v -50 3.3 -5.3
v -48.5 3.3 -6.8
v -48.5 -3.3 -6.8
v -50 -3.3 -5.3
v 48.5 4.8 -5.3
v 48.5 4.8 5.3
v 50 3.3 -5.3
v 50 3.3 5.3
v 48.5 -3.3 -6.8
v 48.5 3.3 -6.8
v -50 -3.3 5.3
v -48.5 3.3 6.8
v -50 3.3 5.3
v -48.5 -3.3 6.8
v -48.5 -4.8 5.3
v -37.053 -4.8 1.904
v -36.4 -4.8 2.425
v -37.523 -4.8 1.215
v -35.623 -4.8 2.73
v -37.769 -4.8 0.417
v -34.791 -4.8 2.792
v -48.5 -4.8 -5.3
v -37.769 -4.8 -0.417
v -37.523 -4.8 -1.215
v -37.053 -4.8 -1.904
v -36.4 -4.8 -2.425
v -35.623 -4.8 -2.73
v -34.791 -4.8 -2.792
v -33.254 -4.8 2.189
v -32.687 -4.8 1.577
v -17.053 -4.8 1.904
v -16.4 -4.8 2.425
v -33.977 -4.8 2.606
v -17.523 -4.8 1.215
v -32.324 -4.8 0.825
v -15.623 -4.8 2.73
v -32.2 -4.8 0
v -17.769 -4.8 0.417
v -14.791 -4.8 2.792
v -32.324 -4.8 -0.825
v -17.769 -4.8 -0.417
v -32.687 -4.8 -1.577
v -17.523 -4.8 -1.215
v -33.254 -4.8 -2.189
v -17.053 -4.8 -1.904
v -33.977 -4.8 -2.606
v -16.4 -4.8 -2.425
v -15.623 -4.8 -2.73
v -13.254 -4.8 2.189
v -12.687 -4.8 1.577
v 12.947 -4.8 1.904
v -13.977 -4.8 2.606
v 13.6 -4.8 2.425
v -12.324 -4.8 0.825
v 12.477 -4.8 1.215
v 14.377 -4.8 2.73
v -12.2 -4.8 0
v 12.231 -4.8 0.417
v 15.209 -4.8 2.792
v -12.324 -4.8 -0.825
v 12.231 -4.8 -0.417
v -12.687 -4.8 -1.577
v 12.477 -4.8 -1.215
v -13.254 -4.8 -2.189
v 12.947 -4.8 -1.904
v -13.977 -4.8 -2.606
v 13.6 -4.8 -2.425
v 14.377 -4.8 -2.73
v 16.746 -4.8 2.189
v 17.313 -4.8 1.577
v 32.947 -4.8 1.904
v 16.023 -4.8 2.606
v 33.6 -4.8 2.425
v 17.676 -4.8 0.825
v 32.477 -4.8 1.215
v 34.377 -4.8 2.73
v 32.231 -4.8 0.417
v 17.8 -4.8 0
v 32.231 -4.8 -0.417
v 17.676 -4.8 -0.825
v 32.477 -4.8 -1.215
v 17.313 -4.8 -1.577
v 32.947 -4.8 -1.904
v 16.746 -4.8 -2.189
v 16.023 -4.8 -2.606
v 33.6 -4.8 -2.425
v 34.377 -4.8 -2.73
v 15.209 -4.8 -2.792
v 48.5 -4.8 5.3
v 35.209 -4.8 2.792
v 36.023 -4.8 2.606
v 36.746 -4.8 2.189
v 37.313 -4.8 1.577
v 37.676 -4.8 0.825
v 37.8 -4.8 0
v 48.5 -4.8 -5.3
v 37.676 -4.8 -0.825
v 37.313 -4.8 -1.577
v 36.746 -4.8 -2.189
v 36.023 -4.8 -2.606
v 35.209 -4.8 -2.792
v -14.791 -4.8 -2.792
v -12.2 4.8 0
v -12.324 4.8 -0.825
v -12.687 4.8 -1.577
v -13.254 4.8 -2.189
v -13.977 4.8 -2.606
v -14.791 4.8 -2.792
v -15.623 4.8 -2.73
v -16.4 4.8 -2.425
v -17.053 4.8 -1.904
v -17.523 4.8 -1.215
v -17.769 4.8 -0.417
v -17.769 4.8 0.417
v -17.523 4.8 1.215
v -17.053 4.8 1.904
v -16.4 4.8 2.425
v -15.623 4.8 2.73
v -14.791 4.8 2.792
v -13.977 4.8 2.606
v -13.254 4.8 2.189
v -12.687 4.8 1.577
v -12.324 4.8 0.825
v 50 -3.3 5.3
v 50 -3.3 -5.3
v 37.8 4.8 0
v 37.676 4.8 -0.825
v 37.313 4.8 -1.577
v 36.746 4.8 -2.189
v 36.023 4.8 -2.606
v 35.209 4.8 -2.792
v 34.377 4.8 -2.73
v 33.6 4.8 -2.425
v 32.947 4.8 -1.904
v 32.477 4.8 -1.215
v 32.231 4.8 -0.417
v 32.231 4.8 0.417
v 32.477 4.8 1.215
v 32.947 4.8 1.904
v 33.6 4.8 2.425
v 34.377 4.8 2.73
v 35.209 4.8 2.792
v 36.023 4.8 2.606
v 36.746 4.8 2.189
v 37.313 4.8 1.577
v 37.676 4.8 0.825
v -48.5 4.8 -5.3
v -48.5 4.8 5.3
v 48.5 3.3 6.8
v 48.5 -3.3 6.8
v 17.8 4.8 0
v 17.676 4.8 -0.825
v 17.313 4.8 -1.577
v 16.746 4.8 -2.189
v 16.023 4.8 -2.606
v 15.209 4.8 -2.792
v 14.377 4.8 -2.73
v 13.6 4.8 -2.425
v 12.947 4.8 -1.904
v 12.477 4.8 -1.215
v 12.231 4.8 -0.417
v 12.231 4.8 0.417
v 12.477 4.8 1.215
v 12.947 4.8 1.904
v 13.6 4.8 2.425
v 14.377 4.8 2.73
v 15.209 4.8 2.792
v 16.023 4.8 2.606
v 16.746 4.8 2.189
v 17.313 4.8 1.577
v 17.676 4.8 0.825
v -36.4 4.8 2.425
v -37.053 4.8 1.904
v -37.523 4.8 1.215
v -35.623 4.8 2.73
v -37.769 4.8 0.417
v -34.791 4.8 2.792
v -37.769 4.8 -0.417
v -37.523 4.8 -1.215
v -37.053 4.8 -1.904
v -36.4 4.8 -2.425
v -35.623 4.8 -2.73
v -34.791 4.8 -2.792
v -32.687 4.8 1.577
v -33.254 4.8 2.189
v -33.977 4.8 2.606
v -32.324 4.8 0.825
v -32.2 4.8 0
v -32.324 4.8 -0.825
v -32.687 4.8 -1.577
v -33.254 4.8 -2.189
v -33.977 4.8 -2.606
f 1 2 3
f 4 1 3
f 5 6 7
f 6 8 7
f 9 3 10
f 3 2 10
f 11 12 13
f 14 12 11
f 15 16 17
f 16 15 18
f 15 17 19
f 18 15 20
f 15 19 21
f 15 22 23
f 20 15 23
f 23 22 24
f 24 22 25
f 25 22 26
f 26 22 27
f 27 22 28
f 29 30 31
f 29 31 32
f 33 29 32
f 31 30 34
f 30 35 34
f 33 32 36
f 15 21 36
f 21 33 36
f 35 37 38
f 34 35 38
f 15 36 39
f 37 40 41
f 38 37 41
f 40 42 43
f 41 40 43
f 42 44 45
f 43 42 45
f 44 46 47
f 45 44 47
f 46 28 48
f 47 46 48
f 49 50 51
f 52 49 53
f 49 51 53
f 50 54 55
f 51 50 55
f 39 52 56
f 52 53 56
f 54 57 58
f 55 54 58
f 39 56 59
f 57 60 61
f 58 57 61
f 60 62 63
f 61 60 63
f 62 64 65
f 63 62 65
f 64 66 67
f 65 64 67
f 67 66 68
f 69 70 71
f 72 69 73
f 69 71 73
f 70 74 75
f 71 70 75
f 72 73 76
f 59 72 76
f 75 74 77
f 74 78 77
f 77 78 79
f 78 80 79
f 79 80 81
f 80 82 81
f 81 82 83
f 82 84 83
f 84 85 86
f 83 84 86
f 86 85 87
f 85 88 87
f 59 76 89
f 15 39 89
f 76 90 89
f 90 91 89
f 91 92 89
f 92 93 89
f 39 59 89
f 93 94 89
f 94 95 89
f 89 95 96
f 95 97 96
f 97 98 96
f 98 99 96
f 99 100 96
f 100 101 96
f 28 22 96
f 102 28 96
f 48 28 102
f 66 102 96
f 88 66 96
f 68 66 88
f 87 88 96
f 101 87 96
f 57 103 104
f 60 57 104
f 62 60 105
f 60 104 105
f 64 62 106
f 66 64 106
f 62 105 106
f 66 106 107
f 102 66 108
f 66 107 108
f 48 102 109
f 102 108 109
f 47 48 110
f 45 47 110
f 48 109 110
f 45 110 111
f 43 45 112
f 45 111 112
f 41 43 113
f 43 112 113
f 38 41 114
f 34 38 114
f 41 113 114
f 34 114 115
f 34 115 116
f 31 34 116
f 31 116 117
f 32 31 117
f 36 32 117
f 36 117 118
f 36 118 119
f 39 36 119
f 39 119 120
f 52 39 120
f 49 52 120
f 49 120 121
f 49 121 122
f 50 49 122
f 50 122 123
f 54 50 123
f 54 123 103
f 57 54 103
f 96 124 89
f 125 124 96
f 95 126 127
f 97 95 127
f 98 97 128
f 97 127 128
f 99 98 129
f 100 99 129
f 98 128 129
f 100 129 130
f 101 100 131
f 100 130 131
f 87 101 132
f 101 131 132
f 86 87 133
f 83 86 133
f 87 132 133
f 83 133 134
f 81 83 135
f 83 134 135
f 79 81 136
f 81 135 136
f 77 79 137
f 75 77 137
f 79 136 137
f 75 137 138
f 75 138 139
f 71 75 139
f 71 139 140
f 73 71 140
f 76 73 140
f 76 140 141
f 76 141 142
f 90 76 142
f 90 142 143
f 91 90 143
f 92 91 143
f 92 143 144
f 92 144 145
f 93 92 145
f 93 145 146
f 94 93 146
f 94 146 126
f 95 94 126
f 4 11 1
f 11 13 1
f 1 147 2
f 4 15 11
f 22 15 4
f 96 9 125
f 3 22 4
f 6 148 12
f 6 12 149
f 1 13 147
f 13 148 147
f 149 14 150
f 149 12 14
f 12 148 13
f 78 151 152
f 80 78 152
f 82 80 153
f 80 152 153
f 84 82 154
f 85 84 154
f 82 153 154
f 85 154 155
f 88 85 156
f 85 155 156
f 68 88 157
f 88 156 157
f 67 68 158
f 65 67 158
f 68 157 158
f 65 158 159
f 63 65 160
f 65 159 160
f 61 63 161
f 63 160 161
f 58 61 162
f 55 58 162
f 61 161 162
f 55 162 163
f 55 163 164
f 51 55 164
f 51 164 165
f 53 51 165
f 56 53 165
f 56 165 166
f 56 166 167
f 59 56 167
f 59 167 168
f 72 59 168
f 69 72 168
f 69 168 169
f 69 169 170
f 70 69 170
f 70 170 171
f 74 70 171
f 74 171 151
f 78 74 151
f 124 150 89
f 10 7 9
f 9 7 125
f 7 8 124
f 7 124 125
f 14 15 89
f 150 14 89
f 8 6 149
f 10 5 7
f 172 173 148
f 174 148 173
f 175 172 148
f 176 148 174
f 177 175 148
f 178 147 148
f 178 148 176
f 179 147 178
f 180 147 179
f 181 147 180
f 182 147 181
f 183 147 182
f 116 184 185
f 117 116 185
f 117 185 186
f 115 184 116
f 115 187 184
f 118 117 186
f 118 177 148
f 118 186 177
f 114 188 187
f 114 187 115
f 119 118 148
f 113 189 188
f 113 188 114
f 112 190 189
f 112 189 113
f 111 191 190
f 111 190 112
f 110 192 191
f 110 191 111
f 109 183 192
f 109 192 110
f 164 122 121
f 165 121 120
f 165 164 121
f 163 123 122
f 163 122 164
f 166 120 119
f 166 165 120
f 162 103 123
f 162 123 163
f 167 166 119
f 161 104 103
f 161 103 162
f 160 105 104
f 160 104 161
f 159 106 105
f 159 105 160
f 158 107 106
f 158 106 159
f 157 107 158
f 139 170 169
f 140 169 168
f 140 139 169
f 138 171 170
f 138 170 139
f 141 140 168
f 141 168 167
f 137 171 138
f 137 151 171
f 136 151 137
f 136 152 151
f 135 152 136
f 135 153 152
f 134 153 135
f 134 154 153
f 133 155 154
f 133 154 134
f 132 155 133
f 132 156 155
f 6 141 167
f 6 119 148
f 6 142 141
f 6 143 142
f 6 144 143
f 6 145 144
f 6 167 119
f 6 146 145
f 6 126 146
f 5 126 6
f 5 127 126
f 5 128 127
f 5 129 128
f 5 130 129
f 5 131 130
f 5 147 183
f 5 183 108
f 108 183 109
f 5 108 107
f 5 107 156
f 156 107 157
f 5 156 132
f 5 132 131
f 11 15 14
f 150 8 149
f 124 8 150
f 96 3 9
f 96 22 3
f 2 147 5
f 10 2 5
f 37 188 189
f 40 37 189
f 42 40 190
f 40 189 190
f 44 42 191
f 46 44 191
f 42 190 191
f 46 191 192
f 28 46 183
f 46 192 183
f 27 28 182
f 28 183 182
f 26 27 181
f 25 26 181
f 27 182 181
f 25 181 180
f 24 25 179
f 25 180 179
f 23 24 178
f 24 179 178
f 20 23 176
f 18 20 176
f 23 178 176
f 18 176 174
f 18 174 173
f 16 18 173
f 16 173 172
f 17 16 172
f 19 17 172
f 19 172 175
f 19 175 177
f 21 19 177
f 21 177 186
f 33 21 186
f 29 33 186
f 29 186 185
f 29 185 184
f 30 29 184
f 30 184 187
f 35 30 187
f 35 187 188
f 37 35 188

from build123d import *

# Parameters (mm, degrees)
SCHIZZO1_W                   = 100
SCHIZZO1_H                   = 13.6
ESTRUSIONE_ESTRUSIONE1_DEPTH = 9.6
FORO_5_6_5_6_1_D             = 5.6
SMUSSO1_SIZE                 = 1.5


with BuildPart() as part:
    # Schizzo1 → Estrusione-Estrusione1 (new body)
    with BuildSketch(Plane(origin=(0, 4.8, 0), x_dir=(1, 0, 0), z_dir=(0, 1, 0))):
        Rectangle(SCHIZZO1_W, SCHIZZO1_H)
    extrude(amount=-ESTRUSIONE_ESTRUSIONE1_DEPTH)

    # Foro Ø5.6 (5.6)-1 (through all)
    with Locations(Plane(origin=(0, -4.8, 0), x_dir=(-1, 0, 0), z_dir=(0, -1, 0))):
        with Locations((-35, 0), (35, 0), (-15, 0), (15, 0)):
            Hole(FORO_5_6_5_6_1_D / 2)

    # Smusso1
    smusso1_edges = [part.edges().sort_by_distance(p)[0] for p in [
        (0, -4.8, -6.8),
        (-50, -4.8, 0),
        (0, -4.8, 6.8),
        (-50, 4.8, 0),
        (0, 4.8, -6.8),
        (50, 4.8, 0),
        (0, 4.8, 6.8),
        (-50, 0, 6.8),
        (-50, 0, -6.8),
        (50, 0, -6.8),
        (50, 0, 6.8),
        (50, -4.8, 0),
    ]]
    chamfer(smusso1_edges, length=SMUSSO1_SIZE)


solid = part.part
